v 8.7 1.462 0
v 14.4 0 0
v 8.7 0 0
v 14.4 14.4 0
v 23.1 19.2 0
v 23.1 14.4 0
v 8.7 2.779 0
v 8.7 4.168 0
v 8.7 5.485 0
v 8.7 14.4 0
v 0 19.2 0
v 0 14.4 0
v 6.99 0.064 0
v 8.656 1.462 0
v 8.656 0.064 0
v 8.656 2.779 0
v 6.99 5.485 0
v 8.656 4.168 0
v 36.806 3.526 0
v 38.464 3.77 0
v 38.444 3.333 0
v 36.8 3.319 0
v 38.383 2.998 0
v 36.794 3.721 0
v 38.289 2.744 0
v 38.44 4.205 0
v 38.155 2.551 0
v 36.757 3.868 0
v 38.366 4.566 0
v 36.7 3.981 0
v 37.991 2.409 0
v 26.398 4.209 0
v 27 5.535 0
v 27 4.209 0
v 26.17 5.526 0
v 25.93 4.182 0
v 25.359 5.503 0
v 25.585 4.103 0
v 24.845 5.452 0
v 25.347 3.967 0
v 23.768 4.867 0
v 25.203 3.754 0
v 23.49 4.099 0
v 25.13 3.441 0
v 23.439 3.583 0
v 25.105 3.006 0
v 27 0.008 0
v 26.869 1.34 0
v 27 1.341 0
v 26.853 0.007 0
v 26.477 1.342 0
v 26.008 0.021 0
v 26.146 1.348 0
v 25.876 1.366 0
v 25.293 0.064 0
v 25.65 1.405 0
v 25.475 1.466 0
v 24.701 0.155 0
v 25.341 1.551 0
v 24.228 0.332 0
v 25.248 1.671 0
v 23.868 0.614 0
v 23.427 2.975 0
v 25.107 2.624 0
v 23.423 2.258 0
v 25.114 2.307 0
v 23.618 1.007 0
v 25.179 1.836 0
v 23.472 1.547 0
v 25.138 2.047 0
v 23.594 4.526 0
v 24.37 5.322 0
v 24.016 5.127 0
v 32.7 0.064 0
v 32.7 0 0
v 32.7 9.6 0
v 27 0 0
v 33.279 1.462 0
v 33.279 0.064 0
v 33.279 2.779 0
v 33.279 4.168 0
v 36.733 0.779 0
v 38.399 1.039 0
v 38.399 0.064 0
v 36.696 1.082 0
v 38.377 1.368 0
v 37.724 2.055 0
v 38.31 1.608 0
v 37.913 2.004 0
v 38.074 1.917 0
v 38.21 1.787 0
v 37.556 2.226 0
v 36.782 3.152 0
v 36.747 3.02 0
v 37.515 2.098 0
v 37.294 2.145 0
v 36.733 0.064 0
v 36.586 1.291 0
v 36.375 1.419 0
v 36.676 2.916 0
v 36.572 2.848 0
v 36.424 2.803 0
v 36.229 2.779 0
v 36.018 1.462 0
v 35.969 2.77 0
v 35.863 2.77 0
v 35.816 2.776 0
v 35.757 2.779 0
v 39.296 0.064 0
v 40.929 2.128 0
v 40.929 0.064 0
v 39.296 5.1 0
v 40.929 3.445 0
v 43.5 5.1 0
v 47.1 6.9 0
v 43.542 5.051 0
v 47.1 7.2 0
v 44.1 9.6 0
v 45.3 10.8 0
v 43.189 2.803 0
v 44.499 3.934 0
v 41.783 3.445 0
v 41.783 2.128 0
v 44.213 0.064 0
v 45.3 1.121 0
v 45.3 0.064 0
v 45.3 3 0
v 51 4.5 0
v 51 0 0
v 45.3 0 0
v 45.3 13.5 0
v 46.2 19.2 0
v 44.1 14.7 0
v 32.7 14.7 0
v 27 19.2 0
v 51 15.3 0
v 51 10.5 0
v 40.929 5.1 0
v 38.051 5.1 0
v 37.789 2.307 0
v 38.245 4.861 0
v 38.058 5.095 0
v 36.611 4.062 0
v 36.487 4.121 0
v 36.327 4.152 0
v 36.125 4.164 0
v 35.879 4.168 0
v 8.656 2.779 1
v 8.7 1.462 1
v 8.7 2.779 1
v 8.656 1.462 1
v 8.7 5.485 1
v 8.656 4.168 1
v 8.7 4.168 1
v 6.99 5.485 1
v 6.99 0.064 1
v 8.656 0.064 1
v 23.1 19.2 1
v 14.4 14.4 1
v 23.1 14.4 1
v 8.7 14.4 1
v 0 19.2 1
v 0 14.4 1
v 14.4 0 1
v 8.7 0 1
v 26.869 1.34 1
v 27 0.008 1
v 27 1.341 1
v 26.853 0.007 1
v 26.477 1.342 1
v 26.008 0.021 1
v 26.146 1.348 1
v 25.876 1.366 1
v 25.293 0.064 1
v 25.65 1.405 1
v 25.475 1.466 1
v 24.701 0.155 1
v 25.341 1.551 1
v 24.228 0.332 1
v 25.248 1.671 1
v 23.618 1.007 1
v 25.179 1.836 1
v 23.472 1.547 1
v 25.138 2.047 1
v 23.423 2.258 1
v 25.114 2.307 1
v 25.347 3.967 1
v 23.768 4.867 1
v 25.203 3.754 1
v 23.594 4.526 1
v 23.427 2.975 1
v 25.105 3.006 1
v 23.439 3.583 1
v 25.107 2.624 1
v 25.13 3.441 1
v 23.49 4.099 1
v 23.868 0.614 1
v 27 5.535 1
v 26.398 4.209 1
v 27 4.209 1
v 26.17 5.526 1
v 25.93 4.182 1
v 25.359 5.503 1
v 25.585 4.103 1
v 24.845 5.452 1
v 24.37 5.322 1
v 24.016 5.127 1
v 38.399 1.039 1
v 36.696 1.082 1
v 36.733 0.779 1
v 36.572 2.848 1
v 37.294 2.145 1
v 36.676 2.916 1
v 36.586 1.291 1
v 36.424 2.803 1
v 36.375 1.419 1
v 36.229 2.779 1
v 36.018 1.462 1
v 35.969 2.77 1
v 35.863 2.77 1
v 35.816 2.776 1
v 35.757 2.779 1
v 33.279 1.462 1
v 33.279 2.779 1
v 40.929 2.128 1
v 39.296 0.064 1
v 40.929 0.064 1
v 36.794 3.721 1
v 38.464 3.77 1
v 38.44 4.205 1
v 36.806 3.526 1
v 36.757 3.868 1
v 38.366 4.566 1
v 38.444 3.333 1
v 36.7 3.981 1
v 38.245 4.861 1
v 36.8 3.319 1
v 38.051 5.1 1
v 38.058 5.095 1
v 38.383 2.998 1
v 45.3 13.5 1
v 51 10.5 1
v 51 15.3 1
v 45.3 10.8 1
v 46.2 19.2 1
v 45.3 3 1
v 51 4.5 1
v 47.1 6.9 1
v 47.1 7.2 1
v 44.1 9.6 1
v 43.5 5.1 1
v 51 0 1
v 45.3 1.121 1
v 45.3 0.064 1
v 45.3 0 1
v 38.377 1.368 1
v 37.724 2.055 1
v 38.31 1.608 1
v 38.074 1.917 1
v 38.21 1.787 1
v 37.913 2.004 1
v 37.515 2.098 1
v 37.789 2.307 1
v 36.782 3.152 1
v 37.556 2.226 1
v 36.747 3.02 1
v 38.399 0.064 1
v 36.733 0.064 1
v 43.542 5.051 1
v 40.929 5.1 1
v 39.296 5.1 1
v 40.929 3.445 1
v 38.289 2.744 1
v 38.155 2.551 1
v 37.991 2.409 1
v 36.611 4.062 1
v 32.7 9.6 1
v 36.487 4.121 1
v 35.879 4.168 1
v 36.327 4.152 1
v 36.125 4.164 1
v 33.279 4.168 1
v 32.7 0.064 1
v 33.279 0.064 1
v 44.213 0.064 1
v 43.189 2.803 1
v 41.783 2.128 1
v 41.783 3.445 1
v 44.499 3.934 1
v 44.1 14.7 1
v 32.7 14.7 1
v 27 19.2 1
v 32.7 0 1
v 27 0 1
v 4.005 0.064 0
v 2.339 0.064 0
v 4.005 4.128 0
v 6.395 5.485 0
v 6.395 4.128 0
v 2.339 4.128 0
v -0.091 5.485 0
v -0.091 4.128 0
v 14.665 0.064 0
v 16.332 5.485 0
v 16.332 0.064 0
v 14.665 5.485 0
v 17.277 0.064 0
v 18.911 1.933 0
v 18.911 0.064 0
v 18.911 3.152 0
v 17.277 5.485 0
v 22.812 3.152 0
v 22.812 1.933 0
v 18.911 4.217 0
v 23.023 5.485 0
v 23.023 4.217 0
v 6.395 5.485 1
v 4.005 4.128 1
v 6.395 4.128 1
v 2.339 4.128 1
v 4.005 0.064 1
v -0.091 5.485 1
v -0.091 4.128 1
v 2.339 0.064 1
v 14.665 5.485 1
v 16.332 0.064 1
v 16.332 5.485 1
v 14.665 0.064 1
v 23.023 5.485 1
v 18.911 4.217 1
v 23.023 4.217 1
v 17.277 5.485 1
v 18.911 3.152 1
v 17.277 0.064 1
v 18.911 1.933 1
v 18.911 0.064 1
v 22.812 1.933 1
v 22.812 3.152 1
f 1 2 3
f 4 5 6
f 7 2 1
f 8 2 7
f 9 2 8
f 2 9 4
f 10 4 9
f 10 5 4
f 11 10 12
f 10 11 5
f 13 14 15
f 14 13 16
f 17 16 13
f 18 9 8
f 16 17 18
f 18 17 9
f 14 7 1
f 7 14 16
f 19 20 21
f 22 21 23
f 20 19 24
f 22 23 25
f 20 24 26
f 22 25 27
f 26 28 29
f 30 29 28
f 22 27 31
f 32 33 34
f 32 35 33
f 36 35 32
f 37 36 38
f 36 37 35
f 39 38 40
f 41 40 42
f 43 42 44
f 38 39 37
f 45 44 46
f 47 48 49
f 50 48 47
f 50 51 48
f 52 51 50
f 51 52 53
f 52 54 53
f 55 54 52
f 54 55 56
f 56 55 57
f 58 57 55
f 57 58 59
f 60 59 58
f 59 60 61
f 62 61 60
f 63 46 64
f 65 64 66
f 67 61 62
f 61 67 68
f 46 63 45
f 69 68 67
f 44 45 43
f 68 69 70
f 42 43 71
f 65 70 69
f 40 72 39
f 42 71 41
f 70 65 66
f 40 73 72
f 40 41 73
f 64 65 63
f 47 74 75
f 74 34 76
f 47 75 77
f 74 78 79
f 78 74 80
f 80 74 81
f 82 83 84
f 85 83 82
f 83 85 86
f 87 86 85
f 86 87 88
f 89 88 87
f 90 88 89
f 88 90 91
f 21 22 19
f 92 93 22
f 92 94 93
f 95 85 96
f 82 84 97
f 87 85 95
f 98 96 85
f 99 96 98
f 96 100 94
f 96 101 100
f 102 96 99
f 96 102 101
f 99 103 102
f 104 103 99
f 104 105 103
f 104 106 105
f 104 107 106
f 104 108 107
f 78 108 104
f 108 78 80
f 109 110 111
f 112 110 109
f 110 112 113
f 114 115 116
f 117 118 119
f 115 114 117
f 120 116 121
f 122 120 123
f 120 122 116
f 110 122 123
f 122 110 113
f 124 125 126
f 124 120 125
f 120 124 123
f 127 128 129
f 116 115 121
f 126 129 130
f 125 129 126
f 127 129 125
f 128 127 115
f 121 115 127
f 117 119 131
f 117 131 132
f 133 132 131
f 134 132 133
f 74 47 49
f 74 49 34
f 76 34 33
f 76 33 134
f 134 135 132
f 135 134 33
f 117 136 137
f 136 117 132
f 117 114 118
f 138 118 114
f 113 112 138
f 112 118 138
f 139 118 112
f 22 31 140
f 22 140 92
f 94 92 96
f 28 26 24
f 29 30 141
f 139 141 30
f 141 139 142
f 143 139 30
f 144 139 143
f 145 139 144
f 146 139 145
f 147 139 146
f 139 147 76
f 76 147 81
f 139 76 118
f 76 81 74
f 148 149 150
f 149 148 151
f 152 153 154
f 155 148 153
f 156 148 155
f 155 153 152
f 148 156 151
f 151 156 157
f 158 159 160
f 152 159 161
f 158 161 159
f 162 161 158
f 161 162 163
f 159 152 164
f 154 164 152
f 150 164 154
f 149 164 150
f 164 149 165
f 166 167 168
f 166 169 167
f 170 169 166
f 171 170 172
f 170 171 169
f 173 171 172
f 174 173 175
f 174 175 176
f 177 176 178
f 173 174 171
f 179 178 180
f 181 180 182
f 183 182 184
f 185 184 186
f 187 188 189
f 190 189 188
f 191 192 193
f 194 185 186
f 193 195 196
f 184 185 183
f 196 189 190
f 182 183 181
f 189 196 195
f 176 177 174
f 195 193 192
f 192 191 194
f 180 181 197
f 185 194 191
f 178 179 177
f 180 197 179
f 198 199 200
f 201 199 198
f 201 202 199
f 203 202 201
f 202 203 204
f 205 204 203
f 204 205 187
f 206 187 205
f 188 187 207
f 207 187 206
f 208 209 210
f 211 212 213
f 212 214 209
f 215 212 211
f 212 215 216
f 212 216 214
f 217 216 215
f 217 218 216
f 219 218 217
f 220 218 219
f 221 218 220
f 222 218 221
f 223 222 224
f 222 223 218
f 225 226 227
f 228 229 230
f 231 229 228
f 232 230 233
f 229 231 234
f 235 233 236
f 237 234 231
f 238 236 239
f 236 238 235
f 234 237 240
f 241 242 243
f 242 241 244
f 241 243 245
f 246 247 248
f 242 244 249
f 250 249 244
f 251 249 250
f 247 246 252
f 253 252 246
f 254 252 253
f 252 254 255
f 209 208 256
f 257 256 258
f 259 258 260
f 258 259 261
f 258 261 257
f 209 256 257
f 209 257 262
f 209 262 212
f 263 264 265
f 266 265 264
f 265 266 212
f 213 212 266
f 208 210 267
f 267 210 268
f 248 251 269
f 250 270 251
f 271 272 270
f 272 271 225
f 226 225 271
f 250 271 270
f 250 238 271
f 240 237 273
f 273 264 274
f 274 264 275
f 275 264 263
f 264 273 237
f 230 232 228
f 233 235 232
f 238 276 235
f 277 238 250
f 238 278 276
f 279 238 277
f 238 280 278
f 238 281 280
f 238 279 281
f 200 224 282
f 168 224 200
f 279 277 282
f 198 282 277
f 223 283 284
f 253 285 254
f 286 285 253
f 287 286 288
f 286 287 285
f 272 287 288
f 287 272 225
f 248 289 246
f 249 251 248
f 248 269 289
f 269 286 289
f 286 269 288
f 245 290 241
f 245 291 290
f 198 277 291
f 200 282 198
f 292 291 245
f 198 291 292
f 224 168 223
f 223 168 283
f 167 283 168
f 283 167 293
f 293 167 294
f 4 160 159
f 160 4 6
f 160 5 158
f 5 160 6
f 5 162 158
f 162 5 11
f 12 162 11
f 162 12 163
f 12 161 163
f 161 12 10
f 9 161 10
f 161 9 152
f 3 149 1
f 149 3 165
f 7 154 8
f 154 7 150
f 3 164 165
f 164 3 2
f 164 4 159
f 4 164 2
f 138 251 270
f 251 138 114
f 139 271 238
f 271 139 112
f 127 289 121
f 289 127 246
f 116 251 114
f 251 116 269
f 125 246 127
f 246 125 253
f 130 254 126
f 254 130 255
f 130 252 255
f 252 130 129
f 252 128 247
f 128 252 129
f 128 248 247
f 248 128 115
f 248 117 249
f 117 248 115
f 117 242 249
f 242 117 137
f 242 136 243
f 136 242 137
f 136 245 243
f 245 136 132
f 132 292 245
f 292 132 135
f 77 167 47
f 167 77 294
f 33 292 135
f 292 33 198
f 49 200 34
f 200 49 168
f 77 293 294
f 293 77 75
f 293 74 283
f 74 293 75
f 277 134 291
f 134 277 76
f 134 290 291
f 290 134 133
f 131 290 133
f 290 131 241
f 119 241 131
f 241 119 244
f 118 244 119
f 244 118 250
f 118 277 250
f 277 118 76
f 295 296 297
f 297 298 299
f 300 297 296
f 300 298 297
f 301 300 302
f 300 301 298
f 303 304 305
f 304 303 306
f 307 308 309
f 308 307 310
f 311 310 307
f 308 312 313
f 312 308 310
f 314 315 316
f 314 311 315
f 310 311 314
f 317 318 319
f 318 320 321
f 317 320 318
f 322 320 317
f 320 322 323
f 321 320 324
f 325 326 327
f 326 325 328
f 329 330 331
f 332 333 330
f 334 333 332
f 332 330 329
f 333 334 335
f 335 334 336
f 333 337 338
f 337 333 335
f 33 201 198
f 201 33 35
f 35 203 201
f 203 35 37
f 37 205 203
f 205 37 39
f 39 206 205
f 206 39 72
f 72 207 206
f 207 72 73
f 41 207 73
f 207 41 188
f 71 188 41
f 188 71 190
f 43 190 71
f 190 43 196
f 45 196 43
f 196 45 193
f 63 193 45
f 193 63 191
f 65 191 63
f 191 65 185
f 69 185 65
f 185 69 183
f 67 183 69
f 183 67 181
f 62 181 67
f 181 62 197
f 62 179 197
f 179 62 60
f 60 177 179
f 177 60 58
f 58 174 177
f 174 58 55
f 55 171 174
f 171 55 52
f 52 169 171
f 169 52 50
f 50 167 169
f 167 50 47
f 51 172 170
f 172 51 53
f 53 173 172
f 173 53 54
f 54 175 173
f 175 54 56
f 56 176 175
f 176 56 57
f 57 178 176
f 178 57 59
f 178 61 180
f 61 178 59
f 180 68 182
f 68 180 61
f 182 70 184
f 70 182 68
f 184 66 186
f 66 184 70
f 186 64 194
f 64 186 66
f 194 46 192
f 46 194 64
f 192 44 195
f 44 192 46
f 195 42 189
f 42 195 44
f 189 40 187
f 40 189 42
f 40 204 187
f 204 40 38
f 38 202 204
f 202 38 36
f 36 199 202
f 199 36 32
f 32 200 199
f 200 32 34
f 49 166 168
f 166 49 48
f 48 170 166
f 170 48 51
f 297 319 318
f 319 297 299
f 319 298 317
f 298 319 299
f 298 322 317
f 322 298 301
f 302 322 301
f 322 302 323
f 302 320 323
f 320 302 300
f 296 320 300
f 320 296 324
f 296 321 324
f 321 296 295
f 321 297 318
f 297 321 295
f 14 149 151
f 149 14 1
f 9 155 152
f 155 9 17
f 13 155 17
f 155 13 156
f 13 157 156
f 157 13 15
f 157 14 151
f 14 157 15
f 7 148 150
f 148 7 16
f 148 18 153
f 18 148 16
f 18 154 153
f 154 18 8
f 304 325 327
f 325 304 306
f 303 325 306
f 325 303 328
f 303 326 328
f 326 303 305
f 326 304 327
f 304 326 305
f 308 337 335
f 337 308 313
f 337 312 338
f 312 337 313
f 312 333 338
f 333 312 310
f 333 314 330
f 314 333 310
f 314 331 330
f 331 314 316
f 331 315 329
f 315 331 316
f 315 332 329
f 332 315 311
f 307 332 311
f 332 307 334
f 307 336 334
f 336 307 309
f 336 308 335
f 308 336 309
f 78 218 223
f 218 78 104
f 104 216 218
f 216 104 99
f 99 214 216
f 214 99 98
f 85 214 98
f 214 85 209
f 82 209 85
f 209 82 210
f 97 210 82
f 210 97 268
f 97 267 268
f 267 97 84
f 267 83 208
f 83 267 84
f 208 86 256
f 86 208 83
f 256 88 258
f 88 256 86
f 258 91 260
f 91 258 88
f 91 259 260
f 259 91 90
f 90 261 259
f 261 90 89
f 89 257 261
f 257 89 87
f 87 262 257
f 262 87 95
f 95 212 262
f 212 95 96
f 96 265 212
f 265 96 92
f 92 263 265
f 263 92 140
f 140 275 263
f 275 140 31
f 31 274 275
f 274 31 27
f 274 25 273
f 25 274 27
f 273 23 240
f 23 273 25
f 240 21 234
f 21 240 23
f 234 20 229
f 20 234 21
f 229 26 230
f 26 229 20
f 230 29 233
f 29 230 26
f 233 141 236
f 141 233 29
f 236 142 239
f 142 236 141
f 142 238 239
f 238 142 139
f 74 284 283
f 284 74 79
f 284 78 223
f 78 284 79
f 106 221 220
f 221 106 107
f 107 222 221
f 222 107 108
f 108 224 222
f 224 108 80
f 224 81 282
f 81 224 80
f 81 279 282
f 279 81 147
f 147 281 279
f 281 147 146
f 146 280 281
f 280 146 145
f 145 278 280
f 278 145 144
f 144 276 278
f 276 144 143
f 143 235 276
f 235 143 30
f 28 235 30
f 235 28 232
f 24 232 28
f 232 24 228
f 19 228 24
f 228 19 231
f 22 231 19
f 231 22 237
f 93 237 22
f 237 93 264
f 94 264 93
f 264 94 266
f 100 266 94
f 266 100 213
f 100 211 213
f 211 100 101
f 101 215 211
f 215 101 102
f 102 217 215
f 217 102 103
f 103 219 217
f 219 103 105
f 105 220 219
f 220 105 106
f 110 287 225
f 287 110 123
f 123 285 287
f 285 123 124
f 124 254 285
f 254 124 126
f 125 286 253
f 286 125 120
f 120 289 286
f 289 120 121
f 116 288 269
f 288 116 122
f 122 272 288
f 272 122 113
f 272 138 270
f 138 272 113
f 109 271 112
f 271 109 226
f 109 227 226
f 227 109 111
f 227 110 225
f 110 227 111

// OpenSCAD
size = 0.3;
linear_extrude(height=1) {
	scale(size) polygon(points=[
		[29,0],[29,48],[0,48],[0,64],[77,64],[77,48],[48,48],[48,0],
	], paths=[
		[0,1,2,3,4,5,6,7]
	]);
	
	translate([90*size, 0]) scale(size) polygon(points=[
		[0,0], [0,64], [64,64], [80,51], [80,35], [67,24], [67,23], [80,15], [80,0], [61,0], [61,10], [55,17], [19,17], [19,0],
		[19, 32], [19, 49], [57, 49], [61, 45], [61, 36], [57, 32]
	
	], paths=[
		[0,1,2,3,4,5,6,7, 8, 9, 10, 11, 12, 13], [14, 15, 16, 17, 18, 19]
	]);
};

linear_extrude(height = 1) scale(0.4) import(file = "Trifork.dxf");
